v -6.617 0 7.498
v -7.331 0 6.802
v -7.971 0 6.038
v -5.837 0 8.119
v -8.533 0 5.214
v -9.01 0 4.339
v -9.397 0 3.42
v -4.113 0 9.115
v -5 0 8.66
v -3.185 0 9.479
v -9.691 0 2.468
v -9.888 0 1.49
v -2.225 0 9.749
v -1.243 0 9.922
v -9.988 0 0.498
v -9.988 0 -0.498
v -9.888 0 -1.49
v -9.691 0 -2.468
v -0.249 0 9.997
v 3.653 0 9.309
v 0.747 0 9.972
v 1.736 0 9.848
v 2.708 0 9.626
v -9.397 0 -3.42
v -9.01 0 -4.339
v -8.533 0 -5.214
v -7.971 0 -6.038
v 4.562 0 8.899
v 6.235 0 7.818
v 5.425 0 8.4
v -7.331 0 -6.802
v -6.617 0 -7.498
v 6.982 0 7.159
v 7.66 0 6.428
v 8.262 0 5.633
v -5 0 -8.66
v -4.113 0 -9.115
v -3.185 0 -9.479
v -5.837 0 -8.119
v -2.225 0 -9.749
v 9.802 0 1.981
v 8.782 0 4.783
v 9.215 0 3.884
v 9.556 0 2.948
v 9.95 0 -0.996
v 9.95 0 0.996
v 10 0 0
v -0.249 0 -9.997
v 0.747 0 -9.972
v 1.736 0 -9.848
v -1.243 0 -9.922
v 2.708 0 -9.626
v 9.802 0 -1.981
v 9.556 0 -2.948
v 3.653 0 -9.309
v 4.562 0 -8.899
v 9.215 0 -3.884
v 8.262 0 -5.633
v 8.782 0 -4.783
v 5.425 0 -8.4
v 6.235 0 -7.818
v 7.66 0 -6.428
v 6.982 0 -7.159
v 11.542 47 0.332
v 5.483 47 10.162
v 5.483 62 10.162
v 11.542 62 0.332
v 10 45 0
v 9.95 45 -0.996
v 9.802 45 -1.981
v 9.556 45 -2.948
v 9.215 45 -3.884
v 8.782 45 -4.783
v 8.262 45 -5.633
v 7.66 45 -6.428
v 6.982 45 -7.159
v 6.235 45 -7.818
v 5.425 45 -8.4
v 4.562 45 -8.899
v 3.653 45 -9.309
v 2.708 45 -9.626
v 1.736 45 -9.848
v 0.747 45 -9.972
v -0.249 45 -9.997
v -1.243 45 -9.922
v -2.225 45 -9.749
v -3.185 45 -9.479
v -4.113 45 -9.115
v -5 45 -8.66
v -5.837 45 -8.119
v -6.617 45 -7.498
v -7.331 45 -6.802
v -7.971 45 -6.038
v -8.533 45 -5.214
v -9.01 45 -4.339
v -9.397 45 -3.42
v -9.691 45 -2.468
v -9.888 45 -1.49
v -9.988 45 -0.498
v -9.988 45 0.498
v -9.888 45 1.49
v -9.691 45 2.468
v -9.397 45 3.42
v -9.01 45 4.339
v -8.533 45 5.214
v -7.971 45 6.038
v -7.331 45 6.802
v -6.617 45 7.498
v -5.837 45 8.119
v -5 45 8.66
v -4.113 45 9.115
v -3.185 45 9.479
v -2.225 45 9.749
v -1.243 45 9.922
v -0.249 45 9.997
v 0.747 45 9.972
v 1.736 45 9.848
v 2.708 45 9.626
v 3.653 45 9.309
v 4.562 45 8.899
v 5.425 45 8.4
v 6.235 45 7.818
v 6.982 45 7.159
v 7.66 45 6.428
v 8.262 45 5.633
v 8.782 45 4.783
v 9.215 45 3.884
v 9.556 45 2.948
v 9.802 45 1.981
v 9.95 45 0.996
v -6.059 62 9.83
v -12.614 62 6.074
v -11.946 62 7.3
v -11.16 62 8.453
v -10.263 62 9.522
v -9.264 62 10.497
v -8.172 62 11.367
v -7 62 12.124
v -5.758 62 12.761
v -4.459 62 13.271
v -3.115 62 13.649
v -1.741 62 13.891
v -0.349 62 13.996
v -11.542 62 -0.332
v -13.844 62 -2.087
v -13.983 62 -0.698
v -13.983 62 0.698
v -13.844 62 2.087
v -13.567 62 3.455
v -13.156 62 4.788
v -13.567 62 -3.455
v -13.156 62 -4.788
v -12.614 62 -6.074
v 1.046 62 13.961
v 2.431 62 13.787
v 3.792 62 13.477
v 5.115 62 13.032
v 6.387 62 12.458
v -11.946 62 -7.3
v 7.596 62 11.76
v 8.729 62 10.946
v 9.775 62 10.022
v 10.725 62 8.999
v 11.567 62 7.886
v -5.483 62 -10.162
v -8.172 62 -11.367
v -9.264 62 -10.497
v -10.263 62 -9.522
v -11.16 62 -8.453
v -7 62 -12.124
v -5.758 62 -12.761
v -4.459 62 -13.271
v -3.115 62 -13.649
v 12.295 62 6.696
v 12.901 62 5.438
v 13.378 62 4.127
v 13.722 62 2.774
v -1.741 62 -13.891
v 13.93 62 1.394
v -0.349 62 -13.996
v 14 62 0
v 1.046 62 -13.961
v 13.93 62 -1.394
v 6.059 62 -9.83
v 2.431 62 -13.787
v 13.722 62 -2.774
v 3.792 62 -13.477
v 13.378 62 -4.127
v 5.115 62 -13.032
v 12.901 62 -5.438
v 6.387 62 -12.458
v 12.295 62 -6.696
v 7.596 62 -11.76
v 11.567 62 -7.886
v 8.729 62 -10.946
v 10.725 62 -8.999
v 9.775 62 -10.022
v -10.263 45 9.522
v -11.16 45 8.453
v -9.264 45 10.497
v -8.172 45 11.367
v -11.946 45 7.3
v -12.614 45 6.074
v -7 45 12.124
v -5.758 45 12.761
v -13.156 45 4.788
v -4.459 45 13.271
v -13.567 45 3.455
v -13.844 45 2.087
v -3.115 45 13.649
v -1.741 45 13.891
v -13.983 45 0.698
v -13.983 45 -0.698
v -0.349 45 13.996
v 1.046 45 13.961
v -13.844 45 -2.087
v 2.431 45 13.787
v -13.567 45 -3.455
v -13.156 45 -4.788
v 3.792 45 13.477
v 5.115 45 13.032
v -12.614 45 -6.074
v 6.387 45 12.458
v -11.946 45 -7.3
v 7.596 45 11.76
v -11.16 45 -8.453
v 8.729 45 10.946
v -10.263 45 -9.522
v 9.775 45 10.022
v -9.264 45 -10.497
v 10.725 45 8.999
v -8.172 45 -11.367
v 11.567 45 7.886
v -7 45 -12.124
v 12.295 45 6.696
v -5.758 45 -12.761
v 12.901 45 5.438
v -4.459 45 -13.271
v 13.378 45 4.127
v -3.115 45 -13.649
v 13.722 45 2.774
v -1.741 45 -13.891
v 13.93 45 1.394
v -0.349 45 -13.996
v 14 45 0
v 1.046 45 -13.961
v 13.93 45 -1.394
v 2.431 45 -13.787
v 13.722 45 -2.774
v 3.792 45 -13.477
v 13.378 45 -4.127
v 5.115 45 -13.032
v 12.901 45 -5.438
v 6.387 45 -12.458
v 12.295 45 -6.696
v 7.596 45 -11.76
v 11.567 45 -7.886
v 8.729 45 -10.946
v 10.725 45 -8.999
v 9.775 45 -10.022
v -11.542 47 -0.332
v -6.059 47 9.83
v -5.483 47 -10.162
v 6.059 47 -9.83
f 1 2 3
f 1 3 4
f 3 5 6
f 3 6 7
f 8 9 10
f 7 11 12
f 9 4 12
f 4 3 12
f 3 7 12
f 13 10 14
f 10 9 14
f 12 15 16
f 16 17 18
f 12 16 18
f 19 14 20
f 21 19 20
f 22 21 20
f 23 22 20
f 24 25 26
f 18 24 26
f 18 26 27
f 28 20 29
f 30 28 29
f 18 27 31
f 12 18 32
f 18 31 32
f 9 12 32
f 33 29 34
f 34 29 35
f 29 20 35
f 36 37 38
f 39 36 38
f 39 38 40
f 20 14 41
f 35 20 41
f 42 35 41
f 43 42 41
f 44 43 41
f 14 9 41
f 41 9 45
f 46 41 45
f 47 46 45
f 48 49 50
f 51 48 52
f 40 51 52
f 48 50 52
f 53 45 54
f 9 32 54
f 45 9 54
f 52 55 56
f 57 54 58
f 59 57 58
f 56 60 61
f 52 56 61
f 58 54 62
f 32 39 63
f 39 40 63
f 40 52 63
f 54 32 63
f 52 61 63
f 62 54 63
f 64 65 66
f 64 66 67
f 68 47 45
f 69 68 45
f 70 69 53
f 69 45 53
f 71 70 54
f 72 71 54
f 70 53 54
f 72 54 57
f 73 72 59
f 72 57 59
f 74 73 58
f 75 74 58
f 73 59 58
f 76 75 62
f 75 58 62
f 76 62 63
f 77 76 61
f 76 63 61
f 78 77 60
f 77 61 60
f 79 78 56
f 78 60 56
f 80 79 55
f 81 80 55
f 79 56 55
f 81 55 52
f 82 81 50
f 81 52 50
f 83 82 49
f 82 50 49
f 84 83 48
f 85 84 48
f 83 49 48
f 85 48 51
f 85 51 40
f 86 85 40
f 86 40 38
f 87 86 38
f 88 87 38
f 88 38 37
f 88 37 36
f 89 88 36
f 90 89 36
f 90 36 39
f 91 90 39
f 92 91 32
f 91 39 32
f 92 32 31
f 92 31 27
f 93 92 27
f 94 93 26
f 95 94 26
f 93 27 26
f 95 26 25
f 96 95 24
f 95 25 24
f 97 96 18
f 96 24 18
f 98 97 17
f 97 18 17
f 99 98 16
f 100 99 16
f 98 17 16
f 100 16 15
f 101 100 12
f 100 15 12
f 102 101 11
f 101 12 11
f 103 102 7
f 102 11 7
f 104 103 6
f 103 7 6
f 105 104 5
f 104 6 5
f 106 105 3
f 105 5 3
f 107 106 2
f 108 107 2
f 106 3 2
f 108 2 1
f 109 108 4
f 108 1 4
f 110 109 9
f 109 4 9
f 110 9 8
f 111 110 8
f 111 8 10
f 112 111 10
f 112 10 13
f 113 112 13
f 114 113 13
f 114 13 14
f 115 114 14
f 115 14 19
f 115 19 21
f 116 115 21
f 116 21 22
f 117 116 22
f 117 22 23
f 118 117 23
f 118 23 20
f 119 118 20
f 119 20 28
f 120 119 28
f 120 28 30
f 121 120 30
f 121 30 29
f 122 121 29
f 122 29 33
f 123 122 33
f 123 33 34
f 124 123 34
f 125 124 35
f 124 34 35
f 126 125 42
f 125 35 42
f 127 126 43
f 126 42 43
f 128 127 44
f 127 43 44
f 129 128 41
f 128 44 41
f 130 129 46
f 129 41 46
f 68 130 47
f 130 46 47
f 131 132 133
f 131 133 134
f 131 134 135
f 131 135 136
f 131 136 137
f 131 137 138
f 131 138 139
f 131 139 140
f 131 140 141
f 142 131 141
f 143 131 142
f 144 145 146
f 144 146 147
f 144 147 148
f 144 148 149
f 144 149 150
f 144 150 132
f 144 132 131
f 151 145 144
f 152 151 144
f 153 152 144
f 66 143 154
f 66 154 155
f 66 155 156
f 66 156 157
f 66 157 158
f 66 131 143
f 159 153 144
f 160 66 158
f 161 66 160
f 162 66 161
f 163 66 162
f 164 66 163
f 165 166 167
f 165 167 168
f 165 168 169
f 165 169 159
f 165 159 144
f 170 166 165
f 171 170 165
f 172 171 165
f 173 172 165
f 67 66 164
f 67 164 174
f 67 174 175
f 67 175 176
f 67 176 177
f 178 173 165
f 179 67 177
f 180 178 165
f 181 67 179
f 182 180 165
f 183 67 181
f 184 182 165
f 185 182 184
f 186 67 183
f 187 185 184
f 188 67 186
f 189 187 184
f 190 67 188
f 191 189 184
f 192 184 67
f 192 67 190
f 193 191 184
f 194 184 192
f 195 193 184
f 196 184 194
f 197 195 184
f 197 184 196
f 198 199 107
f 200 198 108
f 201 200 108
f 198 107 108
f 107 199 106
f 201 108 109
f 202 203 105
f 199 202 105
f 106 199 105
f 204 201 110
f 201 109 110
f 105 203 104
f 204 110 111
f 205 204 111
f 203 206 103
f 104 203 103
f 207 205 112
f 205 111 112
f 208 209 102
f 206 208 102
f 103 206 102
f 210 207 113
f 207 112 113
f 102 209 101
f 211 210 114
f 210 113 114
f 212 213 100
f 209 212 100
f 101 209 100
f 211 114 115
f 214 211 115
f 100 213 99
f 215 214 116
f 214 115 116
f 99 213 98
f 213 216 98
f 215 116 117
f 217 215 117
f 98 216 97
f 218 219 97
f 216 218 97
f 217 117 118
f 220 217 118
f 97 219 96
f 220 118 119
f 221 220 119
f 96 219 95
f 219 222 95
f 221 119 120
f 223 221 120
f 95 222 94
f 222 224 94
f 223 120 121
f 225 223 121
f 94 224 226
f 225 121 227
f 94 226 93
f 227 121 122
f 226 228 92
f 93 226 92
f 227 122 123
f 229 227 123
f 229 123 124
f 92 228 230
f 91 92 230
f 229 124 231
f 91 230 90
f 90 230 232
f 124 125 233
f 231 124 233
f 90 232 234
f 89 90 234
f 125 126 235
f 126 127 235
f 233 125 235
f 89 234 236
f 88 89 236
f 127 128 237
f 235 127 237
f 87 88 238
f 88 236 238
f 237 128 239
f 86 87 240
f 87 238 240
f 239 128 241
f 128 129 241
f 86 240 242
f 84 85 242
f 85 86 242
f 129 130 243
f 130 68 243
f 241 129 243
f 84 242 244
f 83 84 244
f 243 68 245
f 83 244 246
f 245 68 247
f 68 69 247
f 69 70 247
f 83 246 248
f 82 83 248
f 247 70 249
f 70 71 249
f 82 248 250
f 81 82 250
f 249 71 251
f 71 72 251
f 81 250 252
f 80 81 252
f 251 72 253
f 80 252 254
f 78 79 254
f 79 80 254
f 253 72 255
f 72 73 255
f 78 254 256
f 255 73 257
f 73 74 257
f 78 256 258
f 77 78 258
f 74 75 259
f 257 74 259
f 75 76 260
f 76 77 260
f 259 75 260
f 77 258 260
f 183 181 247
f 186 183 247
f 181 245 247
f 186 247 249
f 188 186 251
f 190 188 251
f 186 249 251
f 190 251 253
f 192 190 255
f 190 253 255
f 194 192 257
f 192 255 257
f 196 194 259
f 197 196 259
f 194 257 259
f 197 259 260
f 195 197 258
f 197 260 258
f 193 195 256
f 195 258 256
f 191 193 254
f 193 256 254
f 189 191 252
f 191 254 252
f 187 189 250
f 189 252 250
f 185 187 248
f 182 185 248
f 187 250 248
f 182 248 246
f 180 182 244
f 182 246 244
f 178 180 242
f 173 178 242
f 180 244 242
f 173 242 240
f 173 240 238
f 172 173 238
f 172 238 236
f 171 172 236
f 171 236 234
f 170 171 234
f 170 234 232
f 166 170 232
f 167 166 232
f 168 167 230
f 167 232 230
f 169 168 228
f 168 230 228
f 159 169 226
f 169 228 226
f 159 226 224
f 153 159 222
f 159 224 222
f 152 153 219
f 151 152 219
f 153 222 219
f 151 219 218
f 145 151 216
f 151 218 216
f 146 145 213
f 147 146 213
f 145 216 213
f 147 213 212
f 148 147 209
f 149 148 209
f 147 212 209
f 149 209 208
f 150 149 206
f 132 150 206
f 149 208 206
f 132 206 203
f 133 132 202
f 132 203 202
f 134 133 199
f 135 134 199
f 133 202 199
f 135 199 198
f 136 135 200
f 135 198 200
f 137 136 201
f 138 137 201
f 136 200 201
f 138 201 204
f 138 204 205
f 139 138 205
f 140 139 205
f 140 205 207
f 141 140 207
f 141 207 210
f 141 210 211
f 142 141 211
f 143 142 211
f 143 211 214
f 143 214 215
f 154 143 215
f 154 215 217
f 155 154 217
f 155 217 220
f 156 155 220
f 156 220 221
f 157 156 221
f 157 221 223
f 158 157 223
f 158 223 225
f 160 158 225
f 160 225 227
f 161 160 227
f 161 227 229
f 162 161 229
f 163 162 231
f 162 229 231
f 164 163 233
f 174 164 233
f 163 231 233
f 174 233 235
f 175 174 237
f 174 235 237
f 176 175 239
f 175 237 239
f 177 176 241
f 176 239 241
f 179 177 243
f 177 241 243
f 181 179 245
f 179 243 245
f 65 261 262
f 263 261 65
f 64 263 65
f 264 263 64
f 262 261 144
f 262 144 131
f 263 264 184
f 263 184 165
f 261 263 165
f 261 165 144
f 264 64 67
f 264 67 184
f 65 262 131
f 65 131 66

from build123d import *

# Parameters (mm, degrees)
SKETCH1_R           = 10
BOSS_EXTRUDE1_DEPTH = 45
SKETCH2_R           = 14
BOSS_EXTRUDE2_DEPTH = 2
SKETCH3_R           = 14
BOSS_EXTRUDE3_DEPTH = 15


with BuildPart() as part:
    # Sketch1 → Boss-Extrude1 (new body)
    with BuildSketch(Plane(origin=(0, 0, 0), x_dir=(1, 0, 0), z_dir=(0, 1, 0))):
        Circle(SKETCH1_R)
    extrude(amount=BOSS_EXTRUDE1_DEPTH)

    # Sketch2 → Boss-Extrude2 (add)
    with BuildSketch(Plane(origin=(0, 45, 0), x_dir=(1, 0, 0), z_dir=(0, 1, 0))):
        Circle(SKETCH2_R)
    extrude(amount=BOSS_EXTRUDE2_DEPTH)

    # Sketch3 → Boss-Extrude3 (add)
    with BuildSketch(Plane(origin=(0, 47, 0), x_dir=(1, 0, 0), z_dir=(0, 1, 0))):
        Circle(SKETCH3_R)
        Polygon((11.542222646, -0.332309673), (6.058899942, 9.829703191), (-5.483322704, 10.162012864), (-11.542222646, 0.332309673), (-6.058899942, -9.829703191), (5.483322704, -10.162012864), align=None, mode=Mode.SUBTRACT)
    extrude(amount=BOSS_EXTRUDE3_DEPTH)


solid = part.part
